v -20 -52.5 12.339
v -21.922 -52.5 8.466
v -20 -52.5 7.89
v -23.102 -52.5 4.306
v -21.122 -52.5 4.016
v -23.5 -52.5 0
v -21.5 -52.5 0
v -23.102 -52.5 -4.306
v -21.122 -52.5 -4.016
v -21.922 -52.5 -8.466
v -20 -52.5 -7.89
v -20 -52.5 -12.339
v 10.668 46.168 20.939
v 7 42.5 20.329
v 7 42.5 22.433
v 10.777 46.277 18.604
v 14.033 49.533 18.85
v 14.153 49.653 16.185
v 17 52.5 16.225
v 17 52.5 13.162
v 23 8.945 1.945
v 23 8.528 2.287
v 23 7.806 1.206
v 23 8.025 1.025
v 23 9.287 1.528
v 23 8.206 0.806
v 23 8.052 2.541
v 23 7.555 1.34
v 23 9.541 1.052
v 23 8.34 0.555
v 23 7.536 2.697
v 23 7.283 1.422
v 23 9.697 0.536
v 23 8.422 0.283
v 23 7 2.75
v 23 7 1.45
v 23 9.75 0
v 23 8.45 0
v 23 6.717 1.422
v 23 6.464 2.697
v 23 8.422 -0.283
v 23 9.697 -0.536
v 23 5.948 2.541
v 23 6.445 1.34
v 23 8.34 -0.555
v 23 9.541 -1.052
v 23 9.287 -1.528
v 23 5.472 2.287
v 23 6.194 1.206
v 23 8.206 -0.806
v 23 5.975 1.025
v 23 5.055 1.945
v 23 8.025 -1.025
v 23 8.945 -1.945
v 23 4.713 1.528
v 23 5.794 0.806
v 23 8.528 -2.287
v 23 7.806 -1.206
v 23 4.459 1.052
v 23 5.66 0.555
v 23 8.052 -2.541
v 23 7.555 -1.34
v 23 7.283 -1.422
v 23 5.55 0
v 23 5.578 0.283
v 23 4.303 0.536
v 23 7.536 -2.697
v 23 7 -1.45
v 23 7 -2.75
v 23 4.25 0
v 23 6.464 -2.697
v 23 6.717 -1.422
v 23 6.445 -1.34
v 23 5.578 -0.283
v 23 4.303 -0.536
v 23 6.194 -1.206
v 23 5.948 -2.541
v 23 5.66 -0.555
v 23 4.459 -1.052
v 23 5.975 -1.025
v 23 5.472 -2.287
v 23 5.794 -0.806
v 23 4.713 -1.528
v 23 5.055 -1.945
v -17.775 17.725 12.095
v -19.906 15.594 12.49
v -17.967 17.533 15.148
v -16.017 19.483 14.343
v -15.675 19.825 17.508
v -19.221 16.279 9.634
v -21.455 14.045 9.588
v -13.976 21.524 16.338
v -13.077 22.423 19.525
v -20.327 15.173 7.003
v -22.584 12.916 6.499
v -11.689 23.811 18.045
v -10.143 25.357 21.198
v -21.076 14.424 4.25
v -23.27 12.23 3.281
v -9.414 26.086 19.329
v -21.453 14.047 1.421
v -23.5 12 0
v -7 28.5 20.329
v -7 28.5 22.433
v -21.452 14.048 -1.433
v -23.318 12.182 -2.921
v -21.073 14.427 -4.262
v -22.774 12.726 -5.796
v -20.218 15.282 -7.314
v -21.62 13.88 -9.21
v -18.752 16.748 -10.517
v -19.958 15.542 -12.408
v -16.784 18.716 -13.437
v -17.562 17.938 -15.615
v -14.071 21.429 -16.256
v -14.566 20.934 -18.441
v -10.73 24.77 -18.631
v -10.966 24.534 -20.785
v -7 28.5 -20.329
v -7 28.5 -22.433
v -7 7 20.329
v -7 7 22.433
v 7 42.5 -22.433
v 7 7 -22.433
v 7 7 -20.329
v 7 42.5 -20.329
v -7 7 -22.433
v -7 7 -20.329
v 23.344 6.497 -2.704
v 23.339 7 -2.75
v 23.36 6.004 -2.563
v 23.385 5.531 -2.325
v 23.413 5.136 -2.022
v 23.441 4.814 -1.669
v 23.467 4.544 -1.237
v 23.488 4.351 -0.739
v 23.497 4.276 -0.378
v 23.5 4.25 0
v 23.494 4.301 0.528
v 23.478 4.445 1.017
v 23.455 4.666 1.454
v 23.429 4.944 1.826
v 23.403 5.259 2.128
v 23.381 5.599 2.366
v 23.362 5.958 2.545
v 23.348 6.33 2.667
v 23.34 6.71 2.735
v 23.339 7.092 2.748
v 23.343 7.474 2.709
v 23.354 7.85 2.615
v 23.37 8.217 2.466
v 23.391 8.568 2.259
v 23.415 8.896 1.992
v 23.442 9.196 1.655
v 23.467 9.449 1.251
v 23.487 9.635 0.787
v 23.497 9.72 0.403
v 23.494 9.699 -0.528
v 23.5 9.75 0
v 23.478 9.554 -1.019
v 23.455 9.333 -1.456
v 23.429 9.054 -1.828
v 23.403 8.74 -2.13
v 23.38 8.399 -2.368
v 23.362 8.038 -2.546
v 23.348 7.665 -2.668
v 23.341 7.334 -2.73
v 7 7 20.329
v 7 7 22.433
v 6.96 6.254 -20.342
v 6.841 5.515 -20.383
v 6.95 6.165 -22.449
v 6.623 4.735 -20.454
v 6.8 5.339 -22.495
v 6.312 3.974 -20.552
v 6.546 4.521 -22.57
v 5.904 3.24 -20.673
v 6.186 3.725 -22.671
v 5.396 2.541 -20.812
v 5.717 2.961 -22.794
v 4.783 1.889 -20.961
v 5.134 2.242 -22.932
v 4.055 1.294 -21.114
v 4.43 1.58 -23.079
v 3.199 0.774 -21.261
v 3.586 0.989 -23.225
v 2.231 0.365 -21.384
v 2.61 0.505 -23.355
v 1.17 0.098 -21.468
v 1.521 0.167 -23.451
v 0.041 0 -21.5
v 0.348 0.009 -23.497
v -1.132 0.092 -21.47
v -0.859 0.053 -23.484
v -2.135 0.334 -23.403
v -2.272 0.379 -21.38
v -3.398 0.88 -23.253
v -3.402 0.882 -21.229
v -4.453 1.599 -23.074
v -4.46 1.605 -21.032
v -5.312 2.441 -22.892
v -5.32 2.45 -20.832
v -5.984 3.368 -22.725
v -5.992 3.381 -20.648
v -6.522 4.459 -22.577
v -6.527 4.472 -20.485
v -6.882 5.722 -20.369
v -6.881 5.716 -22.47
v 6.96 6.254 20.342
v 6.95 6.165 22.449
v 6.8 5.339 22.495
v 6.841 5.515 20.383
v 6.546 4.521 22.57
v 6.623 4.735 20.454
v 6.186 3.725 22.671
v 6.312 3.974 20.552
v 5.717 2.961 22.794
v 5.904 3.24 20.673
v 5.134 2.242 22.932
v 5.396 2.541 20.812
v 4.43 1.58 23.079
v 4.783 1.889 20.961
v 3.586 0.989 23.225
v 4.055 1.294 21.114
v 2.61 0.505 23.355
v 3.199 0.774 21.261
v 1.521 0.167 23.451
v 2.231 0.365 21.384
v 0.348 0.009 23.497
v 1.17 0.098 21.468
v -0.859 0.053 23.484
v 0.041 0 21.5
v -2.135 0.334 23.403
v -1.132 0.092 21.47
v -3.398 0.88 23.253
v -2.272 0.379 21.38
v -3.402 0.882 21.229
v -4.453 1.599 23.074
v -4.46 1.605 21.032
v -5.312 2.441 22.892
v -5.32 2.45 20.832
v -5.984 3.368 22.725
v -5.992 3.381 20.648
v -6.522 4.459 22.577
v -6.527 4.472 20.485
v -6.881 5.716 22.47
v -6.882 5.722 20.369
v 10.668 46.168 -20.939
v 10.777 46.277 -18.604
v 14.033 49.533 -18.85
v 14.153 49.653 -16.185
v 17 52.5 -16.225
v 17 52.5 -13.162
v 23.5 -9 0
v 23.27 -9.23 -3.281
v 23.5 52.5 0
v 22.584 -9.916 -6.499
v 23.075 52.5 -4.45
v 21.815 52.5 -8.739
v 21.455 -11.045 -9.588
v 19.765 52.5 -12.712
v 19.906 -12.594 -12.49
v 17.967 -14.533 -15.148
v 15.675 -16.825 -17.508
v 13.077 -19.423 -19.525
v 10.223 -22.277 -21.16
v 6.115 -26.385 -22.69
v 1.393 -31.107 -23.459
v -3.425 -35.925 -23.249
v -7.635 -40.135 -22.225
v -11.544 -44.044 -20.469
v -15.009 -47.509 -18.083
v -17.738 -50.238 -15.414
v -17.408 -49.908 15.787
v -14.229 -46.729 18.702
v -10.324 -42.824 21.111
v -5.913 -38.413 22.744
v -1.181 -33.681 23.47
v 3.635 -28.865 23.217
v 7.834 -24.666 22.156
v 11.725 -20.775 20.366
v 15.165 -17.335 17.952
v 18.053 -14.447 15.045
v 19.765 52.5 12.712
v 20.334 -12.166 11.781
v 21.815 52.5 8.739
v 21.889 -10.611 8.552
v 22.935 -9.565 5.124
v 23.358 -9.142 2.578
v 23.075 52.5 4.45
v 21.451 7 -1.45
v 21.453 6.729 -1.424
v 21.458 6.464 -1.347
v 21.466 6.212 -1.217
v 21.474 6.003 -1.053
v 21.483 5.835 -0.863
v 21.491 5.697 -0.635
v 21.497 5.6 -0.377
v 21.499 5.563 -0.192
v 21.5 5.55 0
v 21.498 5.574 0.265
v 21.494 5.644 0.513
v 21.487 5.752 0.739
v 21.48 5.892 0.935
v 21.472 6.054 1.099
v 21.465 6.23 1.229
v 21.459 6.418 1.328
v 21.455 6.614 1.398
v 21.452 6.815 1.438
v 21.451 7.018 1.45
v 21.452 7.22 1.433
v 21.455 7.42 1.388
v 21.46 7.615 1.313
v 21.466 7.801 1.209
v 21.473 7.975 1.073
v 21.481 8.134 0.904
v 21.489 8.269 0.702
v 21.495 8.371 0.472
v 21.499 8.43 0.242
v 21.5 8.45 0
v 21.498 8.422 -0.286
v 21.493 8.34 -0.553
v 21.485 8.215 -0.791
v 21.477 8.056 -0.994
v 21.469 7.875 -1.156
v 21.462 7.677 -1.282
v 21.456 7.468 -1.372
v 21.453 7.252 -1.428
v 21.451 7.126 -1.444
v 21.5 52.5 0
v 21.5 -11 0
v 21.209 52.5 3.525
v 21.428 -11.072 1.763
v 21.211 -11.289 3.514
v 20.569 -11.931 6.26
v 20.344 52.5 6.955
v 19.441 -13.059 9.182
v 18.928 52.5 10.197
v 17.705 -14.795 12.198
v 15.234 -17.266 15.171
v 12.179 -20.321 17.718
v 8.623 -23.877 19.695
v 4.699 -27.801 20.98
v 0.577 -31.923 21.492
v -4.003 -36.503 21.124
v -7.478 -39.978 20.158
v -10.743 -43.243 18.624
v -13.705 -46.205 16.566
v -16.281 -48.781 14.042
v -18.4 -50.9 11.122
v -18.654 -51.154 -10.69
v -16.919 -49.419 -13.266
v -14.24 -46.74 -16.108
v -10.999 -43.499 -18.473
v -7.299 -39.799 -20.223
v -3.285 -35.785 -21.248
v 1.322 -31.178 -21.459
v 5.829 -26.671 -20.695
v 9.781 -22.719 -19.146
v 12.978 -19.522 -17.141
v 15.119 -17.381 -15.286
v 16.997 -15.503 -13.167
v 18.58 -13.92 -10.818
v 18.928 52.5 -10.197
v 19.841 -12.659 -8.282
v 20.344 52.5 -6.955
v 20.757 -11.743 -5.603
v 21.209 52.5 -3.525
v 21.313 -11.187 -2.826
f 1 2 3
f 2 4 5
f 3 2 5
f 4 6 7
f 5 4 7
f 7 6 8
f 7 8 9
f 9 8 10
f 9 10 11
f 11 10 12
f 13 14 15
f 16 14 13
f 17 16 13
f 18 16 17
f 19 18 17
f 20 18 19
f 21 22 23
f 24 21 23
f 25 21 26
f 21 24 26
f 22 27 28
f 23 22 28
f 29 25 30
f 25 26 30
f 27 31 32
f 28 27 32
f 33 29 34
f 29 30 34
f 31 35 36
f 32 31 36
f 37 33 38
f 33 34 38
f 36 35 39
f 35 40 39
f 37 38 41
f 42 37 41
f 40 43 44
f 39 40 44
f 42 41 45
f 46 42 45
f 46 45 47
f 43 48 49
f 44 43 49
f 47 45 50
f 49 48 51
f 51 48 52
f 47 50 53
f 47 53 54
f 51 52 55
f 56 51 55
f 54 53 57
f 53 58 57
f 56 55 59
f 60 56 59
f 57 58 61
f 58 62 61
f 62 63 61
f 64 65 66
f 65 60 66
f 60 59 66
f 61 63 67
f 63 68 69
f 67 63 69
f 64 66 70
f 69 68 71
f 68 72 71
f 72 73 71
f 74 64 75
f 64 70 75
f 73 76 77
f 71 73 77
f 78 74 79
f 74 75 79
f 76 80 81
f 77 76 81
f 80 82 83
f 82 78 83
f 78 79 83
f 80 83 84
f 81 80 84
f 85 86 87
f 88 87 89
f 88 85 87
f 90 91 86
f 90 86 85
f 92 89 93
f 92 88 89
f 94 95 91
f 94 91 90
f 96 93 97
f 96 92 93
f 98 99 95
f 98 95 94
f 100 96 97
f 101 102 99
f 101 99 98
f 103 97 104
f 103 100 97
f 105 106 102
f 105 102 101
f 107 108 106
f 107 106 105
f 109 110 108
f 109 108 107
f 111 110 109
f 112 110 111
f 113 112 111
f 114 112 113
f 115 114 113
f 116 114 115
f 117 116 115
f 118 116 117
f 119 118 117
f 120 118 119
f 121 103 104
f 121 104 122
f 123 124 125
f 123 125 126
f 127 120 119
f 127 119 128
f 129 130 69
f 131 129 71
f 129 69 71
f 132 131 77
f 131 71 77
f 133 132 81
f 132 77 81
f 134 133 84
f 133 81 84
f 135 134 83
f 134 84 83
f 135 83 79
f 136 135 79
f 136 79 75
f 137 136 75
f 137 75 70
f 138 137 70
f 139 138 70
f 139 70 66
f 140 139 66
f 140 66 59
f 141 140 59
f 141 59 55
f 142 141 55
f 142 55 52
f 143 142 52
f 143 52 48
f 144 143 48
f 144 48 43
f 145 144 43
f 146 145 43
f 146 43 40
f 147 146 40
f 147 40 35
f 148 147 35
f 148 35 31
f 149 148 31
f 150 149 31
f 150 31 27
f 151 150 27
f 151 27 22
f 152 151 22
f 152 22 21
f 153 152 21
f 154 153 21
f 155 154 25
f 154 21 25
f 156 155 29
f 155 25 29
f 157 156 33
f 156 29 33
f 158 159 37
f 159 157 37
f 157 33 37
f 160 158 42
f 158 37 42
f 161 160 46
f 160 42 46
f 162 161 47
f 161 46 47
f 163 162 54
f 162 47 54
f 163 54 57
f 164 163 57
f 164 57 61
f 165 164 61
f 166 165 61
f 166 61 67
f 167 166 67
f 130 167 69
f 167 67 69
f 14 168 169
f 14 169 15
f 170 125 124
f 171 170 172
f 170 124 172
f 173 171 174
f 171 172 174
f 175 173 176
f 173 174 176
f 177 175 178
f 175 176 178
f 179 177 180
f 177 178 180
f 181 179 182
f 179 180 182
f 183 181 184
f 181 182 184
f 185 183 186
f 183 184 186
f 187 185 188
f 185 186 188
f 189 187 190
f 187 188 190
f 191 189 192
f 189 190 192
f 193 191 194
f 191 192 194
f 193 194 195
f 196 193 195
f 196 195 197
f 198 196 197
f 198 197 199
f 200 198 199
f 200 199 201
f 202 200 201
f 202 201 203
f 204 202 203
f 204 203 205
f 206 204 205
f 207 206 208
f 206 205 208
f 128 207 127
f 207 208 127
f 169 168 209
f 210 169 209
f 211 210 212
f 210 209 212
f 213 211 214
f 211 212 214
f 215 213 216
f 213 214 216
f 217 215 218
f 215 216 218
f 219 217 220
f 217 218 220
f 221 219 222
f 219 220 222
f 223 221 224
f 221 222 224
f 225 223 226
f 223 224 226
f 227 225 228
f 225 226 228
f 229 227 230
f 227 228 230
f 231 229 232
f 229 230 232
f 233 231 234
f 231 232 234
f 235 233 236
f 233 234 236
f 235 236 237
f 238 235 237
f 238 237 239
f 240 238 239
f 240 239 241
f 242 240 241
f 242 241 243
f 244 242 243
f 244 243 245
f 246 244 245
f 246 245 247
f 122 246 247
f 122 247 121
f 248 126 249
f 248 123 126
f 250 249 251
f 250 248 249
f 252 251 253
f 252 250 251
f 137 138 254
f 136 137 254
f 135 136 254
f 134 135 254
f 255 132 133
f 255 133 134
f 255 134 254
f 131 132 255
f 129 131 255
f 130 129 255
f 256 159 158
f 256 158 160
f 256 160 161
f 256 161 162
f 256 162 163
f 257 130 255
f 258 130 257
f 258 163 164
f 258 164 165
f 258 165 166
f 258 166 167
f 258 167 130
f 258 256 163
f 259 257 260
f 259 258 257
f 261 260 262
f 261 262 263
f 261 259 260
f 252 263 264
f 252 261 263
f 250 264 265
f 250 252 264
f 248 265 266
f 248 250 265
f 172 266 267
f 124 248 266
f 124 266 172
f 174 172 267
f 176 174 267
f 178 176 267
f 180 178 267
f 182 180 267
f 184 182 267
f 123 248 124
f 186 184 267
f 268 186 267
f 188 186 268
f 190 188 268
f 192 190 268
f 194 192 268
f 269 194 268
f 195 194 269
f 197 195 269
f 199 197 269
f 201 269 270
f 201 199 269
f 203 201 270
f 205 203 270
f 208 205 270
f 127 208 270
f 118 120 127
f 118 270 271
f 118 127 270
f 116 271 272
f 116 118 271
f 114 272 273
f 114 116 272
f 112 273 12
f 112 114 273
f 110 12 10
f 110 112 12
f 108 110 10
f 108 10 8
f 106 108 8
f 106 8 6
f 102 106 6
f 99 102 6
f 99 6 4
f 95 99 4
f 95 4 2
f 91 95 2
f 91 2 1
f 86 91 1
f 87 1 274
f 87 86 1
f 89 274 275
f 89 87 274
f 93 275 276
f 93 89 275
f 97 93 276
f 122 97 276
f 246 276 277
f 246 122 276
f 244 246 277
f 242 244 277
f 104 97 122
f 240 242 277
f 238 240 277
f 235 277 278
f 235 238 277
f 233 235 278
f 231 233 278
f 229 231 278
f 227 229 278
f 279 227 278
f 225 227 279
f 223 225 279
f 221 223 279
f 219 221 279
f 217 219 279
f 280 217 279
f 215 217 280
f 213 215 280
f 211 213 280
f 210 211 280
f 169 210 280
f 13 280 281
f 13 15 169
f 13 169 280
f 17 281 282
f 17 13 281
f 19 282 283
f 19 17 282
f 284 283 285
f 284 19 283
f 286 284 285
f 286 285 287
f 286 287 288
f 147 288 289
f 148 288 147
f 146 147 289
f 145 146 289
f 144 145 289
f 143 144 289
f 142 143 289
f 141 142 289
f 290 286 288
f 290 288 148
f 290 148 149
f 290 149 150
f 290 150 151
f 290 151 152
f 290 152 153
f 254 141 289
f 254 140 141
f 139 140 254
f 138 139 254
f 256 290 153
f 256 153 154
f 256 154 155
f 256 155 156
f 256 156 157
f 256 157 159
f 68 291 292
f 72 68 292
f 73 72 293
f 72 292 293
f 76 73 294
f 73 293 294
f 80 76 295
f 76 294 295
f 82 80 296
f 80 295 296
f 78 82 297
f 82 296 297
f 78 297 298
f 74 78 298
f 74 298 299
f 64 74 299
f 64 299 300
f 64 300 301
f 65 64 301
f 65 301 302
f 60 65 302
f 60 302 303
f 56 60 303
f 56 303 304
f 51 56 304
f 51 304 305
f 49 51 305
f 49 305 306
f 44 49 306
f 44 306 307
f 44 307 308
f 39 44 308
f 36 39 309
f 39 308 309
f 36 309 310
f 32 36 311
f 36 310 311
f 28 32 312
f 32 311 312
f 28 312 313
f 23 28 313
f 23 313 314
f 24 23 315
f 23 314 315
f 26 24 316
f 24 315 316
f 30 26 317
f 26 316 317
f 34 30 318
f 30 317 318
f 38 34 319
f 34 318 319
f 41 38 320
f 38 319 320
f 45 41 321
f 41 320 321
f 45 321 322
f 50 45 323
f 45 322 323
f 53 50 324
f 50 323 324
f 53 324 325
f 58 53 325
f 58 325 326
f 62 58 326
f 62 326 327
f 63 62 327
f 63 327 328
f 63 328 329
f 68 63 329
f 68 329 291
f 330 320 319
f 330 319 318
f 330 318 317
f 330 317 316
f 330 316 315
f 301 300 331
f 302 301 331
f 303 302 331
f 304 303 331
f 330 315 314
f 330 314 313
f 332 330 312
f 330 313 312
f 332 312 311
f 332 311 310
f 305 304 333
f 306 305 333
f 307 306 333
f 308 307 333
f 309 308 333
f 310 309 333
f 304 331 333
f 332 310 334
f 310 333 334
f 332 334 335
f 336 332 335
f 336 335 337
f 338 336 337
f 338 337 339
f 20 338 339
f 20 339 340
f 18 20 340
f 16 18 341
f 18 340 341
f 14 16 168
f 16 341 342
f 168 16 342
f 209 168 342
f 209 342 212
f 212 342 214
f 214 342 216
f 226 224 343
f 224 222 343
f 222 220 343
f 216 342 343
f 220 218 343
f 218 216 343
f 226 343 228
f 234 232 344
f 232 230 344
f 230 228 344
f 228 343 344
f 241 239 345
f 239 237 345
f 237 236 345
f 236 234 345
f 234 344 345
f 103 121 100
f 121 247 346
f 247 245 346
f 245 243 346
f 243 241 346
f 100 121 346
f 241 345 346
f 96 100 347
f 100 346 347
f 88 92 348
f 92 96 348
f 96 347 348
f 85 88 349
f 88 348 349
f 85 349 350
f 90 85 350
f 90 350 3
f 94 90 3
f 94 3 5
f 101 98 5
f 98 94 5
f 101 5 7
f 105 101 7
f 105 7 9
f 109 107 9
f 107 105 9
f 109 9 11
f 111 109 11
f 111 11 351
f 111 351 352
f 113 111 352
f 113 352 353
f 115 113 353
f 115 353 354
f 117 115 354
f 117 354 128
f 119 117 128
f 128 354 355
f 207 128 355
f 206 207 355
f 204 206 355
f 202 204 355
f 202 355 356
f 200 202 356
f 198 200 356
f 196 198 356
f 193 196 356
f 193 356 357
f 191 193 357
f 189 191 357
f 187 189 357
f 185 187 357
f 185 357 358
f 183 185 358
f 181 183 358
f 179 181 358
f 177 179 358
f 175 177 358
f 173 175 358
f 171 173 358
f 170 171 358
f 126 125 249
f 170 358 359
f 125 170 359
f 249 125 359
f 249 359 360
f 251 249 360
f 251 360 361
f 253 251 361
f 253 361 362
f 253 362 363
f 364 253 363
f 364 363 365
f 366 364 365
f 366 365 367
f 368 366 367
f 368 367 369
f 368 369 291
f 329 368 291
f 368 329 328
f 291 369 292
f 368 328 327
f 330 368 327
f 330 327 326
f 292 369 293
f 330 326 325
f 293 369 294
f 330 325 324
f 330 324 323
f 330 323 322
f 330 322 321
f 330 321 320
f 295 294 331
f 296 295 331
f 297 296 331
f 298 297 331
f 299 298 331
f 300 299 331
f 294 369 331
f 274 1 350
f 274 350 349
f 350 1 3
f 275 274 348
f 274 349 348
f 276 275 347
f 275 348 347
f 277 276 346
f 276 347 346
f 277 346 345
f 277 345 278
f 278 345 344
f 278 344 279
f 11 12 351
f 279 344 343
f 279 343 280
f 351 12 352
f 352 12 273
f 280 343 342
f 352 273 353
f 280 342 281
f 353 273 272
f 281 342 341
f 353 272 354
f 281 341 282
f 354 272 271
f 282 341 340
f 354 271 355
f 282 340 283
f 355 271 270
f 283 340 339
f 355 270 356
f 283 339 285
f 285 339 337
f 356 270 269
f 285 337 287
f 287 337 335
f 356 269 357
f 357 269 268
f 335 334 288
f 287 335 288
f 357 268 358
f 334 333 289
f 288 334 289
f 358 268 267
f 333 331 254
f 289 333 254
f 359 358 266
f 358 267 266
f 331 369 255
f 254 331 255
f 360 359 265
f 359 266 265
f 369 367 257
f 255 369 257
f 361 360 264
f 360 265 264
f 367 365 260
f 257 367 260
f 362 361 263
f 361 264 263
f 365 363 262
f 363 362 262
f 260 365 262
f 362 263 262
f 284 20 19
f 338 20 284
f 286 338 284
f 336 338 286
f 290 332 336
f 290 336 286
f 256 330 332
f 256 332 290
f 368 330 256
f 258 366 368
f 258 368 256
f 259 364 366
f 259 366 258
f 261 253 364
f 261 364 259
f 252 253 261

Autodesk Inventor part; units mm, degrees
ref_plane "XZ Plane" through (0, 0, 0) normal (0, 1, 0) x (-1, 0, 0)
ref_plane "XY Plane" through (0, 0, 0) normal (0, 0, 1) x (1, 0, 0)
sketch "Sketch1" plane through (0, 0, 0) normal (0, 0, 1) x (1, 0, 0)
  line L0 (-23.5, -52.5) -> (23.5, -52.5)
  line L1 (23.5, -52.5) -> (23.5, 52.5)
  line L2 (23.5, 52.5) -> (-23.5, 52.5)
  line L3 (-23.5, 52.5) -> (-23.5, -52.5)
  line L4 (-23.5, -52.5) -> (23.5, 52.5) construction
  line L5 (23.5, -52.5) -> (-23.5, 52.5) construction
  line L6 (-23.5, 12) -> (17, 52.5)
  line L7 (-20, -52.5) -> (23.5, -9)
  line L8 (21.5, 52.5) -> (21.5, -52.5)
  line L9 (-21.5, 52.5) -> (-21.5, -52.5)
  line L10 (0, 52.5) -> (0, 7) construction
  line L11 (-7, 52.5) -> (-7, 7)
  line L12 (7, 7) -> (7, 52.5)
  arc A0 (7, 52.5) -> (-7, 52.5) centre (0, 52.5) ccw
  arc A1 (-7, 7) -> (7, 7) centre (0, 7) ccw
  line L13 (0, 52.5) -> (0, -52.5)
  line L14 (0, -74.9) -> (0, 81.9) projected
  point P0 (0, 0)
  point P1 (0, 29.75)
  point P2 (7, 52.5)
  point P3 (-7, 52.5)
  point P4 (-7, 28.5)
  point P5 (7, 42.5)
  dimension "d0" = 2
  dimension "d1" = 2
  dimension "d2" = 47
  dimension "d3" = 14
  dimension "d4" = 105
  dimension "d5" = 52.5
  dimension "d6" = 20
  dimension "d7" = 45
  dimension "d9" = 17
revolve "Revolution1" add sketch "Sketch1" angle 360 about axis through (0, -10, 0) along (0, 1, 0) contours L8 L7 L1 L0 | L8 L2 L1 L7
extrude "Extrusion1" cut sketch "Sketch1" along normal through all both and the other way through all contours L3 L2 L9 L6 | L7 L13 L0 | L9 L2 L11 L6 | L13 L7 L8 L0 | L11 L2 L13 L6 | L6 L13 A1 L11 | L8 L7 L1 L0 | L13 L6 L12 A1 | L13 L2 L12 L6 | A0 L14 L2 | L12 L2 L6 | L14 A0 L2
ref_plane "Work Plane1" through (23.5, 0, 0) normal (1, 0, 0) x (0, 1, 0)
sketch "Sketch2" plane through (23.5, 0, 0) normal (1, 0, 0) x (0, 1, 0)
  arc A0 (52.5, -16.225) -> (42.5, 22.4332) centre (35.5, 0) ccw projected
  line L0 (42.5, 22.4332) -> (7, 22.4332) projected
  line L1 (7, 22.4332) -> (28.5, 22.4332) projected
  arc A1 (28.5, 22.4332) -> (28.5, -22.4332) centre (35.5, 0) ccw projected
  line L2 (28.5, -22.4332) -> (7, -22.4332) projected
  line L3 (7, -22.4332) -> (42.5, -22.4332) projected
  arc A2 (42.5, -22.4332) -> (52.5, 16.225) centre (35.5, 0) ccw projected
  line L4 (52.5, 16.225) -> (52.5, -16.225) projected
  arc A3 (-52.5, -12.339) -> (-52.5, 12.339) centre (-32.5, 0) ccw projected
  line L5 (-52.5, 12.339) -> (-52.5, -12.339) projected
  line L6 (52.5, -16.225) -> (52.5, 16.225) projected
  line L7 (52.5, 0) -> (-9, 0)
  arc A4 (-52.5, -12.339) -> (-52.5, 12.339) centre (-32.5, 0) ccw projected
  point P0 (0, 0)
  point P1 (12, 0)
  point P2 (7, 0)
  dimension "d20" = 5
hole "Hole1" at (23.5, 7, 0) direction (-1, 0, 0) diameter 2.9 depth 5 counterbore diameter 5.5 counterbore depth 0.5 clearance for "Socket Head Cap Screw DIN EN ISO 4762" size "M2.5" standard "DIN"
equation "\"d1\" = d0"
properties part number "Test_Blade_Guard"
